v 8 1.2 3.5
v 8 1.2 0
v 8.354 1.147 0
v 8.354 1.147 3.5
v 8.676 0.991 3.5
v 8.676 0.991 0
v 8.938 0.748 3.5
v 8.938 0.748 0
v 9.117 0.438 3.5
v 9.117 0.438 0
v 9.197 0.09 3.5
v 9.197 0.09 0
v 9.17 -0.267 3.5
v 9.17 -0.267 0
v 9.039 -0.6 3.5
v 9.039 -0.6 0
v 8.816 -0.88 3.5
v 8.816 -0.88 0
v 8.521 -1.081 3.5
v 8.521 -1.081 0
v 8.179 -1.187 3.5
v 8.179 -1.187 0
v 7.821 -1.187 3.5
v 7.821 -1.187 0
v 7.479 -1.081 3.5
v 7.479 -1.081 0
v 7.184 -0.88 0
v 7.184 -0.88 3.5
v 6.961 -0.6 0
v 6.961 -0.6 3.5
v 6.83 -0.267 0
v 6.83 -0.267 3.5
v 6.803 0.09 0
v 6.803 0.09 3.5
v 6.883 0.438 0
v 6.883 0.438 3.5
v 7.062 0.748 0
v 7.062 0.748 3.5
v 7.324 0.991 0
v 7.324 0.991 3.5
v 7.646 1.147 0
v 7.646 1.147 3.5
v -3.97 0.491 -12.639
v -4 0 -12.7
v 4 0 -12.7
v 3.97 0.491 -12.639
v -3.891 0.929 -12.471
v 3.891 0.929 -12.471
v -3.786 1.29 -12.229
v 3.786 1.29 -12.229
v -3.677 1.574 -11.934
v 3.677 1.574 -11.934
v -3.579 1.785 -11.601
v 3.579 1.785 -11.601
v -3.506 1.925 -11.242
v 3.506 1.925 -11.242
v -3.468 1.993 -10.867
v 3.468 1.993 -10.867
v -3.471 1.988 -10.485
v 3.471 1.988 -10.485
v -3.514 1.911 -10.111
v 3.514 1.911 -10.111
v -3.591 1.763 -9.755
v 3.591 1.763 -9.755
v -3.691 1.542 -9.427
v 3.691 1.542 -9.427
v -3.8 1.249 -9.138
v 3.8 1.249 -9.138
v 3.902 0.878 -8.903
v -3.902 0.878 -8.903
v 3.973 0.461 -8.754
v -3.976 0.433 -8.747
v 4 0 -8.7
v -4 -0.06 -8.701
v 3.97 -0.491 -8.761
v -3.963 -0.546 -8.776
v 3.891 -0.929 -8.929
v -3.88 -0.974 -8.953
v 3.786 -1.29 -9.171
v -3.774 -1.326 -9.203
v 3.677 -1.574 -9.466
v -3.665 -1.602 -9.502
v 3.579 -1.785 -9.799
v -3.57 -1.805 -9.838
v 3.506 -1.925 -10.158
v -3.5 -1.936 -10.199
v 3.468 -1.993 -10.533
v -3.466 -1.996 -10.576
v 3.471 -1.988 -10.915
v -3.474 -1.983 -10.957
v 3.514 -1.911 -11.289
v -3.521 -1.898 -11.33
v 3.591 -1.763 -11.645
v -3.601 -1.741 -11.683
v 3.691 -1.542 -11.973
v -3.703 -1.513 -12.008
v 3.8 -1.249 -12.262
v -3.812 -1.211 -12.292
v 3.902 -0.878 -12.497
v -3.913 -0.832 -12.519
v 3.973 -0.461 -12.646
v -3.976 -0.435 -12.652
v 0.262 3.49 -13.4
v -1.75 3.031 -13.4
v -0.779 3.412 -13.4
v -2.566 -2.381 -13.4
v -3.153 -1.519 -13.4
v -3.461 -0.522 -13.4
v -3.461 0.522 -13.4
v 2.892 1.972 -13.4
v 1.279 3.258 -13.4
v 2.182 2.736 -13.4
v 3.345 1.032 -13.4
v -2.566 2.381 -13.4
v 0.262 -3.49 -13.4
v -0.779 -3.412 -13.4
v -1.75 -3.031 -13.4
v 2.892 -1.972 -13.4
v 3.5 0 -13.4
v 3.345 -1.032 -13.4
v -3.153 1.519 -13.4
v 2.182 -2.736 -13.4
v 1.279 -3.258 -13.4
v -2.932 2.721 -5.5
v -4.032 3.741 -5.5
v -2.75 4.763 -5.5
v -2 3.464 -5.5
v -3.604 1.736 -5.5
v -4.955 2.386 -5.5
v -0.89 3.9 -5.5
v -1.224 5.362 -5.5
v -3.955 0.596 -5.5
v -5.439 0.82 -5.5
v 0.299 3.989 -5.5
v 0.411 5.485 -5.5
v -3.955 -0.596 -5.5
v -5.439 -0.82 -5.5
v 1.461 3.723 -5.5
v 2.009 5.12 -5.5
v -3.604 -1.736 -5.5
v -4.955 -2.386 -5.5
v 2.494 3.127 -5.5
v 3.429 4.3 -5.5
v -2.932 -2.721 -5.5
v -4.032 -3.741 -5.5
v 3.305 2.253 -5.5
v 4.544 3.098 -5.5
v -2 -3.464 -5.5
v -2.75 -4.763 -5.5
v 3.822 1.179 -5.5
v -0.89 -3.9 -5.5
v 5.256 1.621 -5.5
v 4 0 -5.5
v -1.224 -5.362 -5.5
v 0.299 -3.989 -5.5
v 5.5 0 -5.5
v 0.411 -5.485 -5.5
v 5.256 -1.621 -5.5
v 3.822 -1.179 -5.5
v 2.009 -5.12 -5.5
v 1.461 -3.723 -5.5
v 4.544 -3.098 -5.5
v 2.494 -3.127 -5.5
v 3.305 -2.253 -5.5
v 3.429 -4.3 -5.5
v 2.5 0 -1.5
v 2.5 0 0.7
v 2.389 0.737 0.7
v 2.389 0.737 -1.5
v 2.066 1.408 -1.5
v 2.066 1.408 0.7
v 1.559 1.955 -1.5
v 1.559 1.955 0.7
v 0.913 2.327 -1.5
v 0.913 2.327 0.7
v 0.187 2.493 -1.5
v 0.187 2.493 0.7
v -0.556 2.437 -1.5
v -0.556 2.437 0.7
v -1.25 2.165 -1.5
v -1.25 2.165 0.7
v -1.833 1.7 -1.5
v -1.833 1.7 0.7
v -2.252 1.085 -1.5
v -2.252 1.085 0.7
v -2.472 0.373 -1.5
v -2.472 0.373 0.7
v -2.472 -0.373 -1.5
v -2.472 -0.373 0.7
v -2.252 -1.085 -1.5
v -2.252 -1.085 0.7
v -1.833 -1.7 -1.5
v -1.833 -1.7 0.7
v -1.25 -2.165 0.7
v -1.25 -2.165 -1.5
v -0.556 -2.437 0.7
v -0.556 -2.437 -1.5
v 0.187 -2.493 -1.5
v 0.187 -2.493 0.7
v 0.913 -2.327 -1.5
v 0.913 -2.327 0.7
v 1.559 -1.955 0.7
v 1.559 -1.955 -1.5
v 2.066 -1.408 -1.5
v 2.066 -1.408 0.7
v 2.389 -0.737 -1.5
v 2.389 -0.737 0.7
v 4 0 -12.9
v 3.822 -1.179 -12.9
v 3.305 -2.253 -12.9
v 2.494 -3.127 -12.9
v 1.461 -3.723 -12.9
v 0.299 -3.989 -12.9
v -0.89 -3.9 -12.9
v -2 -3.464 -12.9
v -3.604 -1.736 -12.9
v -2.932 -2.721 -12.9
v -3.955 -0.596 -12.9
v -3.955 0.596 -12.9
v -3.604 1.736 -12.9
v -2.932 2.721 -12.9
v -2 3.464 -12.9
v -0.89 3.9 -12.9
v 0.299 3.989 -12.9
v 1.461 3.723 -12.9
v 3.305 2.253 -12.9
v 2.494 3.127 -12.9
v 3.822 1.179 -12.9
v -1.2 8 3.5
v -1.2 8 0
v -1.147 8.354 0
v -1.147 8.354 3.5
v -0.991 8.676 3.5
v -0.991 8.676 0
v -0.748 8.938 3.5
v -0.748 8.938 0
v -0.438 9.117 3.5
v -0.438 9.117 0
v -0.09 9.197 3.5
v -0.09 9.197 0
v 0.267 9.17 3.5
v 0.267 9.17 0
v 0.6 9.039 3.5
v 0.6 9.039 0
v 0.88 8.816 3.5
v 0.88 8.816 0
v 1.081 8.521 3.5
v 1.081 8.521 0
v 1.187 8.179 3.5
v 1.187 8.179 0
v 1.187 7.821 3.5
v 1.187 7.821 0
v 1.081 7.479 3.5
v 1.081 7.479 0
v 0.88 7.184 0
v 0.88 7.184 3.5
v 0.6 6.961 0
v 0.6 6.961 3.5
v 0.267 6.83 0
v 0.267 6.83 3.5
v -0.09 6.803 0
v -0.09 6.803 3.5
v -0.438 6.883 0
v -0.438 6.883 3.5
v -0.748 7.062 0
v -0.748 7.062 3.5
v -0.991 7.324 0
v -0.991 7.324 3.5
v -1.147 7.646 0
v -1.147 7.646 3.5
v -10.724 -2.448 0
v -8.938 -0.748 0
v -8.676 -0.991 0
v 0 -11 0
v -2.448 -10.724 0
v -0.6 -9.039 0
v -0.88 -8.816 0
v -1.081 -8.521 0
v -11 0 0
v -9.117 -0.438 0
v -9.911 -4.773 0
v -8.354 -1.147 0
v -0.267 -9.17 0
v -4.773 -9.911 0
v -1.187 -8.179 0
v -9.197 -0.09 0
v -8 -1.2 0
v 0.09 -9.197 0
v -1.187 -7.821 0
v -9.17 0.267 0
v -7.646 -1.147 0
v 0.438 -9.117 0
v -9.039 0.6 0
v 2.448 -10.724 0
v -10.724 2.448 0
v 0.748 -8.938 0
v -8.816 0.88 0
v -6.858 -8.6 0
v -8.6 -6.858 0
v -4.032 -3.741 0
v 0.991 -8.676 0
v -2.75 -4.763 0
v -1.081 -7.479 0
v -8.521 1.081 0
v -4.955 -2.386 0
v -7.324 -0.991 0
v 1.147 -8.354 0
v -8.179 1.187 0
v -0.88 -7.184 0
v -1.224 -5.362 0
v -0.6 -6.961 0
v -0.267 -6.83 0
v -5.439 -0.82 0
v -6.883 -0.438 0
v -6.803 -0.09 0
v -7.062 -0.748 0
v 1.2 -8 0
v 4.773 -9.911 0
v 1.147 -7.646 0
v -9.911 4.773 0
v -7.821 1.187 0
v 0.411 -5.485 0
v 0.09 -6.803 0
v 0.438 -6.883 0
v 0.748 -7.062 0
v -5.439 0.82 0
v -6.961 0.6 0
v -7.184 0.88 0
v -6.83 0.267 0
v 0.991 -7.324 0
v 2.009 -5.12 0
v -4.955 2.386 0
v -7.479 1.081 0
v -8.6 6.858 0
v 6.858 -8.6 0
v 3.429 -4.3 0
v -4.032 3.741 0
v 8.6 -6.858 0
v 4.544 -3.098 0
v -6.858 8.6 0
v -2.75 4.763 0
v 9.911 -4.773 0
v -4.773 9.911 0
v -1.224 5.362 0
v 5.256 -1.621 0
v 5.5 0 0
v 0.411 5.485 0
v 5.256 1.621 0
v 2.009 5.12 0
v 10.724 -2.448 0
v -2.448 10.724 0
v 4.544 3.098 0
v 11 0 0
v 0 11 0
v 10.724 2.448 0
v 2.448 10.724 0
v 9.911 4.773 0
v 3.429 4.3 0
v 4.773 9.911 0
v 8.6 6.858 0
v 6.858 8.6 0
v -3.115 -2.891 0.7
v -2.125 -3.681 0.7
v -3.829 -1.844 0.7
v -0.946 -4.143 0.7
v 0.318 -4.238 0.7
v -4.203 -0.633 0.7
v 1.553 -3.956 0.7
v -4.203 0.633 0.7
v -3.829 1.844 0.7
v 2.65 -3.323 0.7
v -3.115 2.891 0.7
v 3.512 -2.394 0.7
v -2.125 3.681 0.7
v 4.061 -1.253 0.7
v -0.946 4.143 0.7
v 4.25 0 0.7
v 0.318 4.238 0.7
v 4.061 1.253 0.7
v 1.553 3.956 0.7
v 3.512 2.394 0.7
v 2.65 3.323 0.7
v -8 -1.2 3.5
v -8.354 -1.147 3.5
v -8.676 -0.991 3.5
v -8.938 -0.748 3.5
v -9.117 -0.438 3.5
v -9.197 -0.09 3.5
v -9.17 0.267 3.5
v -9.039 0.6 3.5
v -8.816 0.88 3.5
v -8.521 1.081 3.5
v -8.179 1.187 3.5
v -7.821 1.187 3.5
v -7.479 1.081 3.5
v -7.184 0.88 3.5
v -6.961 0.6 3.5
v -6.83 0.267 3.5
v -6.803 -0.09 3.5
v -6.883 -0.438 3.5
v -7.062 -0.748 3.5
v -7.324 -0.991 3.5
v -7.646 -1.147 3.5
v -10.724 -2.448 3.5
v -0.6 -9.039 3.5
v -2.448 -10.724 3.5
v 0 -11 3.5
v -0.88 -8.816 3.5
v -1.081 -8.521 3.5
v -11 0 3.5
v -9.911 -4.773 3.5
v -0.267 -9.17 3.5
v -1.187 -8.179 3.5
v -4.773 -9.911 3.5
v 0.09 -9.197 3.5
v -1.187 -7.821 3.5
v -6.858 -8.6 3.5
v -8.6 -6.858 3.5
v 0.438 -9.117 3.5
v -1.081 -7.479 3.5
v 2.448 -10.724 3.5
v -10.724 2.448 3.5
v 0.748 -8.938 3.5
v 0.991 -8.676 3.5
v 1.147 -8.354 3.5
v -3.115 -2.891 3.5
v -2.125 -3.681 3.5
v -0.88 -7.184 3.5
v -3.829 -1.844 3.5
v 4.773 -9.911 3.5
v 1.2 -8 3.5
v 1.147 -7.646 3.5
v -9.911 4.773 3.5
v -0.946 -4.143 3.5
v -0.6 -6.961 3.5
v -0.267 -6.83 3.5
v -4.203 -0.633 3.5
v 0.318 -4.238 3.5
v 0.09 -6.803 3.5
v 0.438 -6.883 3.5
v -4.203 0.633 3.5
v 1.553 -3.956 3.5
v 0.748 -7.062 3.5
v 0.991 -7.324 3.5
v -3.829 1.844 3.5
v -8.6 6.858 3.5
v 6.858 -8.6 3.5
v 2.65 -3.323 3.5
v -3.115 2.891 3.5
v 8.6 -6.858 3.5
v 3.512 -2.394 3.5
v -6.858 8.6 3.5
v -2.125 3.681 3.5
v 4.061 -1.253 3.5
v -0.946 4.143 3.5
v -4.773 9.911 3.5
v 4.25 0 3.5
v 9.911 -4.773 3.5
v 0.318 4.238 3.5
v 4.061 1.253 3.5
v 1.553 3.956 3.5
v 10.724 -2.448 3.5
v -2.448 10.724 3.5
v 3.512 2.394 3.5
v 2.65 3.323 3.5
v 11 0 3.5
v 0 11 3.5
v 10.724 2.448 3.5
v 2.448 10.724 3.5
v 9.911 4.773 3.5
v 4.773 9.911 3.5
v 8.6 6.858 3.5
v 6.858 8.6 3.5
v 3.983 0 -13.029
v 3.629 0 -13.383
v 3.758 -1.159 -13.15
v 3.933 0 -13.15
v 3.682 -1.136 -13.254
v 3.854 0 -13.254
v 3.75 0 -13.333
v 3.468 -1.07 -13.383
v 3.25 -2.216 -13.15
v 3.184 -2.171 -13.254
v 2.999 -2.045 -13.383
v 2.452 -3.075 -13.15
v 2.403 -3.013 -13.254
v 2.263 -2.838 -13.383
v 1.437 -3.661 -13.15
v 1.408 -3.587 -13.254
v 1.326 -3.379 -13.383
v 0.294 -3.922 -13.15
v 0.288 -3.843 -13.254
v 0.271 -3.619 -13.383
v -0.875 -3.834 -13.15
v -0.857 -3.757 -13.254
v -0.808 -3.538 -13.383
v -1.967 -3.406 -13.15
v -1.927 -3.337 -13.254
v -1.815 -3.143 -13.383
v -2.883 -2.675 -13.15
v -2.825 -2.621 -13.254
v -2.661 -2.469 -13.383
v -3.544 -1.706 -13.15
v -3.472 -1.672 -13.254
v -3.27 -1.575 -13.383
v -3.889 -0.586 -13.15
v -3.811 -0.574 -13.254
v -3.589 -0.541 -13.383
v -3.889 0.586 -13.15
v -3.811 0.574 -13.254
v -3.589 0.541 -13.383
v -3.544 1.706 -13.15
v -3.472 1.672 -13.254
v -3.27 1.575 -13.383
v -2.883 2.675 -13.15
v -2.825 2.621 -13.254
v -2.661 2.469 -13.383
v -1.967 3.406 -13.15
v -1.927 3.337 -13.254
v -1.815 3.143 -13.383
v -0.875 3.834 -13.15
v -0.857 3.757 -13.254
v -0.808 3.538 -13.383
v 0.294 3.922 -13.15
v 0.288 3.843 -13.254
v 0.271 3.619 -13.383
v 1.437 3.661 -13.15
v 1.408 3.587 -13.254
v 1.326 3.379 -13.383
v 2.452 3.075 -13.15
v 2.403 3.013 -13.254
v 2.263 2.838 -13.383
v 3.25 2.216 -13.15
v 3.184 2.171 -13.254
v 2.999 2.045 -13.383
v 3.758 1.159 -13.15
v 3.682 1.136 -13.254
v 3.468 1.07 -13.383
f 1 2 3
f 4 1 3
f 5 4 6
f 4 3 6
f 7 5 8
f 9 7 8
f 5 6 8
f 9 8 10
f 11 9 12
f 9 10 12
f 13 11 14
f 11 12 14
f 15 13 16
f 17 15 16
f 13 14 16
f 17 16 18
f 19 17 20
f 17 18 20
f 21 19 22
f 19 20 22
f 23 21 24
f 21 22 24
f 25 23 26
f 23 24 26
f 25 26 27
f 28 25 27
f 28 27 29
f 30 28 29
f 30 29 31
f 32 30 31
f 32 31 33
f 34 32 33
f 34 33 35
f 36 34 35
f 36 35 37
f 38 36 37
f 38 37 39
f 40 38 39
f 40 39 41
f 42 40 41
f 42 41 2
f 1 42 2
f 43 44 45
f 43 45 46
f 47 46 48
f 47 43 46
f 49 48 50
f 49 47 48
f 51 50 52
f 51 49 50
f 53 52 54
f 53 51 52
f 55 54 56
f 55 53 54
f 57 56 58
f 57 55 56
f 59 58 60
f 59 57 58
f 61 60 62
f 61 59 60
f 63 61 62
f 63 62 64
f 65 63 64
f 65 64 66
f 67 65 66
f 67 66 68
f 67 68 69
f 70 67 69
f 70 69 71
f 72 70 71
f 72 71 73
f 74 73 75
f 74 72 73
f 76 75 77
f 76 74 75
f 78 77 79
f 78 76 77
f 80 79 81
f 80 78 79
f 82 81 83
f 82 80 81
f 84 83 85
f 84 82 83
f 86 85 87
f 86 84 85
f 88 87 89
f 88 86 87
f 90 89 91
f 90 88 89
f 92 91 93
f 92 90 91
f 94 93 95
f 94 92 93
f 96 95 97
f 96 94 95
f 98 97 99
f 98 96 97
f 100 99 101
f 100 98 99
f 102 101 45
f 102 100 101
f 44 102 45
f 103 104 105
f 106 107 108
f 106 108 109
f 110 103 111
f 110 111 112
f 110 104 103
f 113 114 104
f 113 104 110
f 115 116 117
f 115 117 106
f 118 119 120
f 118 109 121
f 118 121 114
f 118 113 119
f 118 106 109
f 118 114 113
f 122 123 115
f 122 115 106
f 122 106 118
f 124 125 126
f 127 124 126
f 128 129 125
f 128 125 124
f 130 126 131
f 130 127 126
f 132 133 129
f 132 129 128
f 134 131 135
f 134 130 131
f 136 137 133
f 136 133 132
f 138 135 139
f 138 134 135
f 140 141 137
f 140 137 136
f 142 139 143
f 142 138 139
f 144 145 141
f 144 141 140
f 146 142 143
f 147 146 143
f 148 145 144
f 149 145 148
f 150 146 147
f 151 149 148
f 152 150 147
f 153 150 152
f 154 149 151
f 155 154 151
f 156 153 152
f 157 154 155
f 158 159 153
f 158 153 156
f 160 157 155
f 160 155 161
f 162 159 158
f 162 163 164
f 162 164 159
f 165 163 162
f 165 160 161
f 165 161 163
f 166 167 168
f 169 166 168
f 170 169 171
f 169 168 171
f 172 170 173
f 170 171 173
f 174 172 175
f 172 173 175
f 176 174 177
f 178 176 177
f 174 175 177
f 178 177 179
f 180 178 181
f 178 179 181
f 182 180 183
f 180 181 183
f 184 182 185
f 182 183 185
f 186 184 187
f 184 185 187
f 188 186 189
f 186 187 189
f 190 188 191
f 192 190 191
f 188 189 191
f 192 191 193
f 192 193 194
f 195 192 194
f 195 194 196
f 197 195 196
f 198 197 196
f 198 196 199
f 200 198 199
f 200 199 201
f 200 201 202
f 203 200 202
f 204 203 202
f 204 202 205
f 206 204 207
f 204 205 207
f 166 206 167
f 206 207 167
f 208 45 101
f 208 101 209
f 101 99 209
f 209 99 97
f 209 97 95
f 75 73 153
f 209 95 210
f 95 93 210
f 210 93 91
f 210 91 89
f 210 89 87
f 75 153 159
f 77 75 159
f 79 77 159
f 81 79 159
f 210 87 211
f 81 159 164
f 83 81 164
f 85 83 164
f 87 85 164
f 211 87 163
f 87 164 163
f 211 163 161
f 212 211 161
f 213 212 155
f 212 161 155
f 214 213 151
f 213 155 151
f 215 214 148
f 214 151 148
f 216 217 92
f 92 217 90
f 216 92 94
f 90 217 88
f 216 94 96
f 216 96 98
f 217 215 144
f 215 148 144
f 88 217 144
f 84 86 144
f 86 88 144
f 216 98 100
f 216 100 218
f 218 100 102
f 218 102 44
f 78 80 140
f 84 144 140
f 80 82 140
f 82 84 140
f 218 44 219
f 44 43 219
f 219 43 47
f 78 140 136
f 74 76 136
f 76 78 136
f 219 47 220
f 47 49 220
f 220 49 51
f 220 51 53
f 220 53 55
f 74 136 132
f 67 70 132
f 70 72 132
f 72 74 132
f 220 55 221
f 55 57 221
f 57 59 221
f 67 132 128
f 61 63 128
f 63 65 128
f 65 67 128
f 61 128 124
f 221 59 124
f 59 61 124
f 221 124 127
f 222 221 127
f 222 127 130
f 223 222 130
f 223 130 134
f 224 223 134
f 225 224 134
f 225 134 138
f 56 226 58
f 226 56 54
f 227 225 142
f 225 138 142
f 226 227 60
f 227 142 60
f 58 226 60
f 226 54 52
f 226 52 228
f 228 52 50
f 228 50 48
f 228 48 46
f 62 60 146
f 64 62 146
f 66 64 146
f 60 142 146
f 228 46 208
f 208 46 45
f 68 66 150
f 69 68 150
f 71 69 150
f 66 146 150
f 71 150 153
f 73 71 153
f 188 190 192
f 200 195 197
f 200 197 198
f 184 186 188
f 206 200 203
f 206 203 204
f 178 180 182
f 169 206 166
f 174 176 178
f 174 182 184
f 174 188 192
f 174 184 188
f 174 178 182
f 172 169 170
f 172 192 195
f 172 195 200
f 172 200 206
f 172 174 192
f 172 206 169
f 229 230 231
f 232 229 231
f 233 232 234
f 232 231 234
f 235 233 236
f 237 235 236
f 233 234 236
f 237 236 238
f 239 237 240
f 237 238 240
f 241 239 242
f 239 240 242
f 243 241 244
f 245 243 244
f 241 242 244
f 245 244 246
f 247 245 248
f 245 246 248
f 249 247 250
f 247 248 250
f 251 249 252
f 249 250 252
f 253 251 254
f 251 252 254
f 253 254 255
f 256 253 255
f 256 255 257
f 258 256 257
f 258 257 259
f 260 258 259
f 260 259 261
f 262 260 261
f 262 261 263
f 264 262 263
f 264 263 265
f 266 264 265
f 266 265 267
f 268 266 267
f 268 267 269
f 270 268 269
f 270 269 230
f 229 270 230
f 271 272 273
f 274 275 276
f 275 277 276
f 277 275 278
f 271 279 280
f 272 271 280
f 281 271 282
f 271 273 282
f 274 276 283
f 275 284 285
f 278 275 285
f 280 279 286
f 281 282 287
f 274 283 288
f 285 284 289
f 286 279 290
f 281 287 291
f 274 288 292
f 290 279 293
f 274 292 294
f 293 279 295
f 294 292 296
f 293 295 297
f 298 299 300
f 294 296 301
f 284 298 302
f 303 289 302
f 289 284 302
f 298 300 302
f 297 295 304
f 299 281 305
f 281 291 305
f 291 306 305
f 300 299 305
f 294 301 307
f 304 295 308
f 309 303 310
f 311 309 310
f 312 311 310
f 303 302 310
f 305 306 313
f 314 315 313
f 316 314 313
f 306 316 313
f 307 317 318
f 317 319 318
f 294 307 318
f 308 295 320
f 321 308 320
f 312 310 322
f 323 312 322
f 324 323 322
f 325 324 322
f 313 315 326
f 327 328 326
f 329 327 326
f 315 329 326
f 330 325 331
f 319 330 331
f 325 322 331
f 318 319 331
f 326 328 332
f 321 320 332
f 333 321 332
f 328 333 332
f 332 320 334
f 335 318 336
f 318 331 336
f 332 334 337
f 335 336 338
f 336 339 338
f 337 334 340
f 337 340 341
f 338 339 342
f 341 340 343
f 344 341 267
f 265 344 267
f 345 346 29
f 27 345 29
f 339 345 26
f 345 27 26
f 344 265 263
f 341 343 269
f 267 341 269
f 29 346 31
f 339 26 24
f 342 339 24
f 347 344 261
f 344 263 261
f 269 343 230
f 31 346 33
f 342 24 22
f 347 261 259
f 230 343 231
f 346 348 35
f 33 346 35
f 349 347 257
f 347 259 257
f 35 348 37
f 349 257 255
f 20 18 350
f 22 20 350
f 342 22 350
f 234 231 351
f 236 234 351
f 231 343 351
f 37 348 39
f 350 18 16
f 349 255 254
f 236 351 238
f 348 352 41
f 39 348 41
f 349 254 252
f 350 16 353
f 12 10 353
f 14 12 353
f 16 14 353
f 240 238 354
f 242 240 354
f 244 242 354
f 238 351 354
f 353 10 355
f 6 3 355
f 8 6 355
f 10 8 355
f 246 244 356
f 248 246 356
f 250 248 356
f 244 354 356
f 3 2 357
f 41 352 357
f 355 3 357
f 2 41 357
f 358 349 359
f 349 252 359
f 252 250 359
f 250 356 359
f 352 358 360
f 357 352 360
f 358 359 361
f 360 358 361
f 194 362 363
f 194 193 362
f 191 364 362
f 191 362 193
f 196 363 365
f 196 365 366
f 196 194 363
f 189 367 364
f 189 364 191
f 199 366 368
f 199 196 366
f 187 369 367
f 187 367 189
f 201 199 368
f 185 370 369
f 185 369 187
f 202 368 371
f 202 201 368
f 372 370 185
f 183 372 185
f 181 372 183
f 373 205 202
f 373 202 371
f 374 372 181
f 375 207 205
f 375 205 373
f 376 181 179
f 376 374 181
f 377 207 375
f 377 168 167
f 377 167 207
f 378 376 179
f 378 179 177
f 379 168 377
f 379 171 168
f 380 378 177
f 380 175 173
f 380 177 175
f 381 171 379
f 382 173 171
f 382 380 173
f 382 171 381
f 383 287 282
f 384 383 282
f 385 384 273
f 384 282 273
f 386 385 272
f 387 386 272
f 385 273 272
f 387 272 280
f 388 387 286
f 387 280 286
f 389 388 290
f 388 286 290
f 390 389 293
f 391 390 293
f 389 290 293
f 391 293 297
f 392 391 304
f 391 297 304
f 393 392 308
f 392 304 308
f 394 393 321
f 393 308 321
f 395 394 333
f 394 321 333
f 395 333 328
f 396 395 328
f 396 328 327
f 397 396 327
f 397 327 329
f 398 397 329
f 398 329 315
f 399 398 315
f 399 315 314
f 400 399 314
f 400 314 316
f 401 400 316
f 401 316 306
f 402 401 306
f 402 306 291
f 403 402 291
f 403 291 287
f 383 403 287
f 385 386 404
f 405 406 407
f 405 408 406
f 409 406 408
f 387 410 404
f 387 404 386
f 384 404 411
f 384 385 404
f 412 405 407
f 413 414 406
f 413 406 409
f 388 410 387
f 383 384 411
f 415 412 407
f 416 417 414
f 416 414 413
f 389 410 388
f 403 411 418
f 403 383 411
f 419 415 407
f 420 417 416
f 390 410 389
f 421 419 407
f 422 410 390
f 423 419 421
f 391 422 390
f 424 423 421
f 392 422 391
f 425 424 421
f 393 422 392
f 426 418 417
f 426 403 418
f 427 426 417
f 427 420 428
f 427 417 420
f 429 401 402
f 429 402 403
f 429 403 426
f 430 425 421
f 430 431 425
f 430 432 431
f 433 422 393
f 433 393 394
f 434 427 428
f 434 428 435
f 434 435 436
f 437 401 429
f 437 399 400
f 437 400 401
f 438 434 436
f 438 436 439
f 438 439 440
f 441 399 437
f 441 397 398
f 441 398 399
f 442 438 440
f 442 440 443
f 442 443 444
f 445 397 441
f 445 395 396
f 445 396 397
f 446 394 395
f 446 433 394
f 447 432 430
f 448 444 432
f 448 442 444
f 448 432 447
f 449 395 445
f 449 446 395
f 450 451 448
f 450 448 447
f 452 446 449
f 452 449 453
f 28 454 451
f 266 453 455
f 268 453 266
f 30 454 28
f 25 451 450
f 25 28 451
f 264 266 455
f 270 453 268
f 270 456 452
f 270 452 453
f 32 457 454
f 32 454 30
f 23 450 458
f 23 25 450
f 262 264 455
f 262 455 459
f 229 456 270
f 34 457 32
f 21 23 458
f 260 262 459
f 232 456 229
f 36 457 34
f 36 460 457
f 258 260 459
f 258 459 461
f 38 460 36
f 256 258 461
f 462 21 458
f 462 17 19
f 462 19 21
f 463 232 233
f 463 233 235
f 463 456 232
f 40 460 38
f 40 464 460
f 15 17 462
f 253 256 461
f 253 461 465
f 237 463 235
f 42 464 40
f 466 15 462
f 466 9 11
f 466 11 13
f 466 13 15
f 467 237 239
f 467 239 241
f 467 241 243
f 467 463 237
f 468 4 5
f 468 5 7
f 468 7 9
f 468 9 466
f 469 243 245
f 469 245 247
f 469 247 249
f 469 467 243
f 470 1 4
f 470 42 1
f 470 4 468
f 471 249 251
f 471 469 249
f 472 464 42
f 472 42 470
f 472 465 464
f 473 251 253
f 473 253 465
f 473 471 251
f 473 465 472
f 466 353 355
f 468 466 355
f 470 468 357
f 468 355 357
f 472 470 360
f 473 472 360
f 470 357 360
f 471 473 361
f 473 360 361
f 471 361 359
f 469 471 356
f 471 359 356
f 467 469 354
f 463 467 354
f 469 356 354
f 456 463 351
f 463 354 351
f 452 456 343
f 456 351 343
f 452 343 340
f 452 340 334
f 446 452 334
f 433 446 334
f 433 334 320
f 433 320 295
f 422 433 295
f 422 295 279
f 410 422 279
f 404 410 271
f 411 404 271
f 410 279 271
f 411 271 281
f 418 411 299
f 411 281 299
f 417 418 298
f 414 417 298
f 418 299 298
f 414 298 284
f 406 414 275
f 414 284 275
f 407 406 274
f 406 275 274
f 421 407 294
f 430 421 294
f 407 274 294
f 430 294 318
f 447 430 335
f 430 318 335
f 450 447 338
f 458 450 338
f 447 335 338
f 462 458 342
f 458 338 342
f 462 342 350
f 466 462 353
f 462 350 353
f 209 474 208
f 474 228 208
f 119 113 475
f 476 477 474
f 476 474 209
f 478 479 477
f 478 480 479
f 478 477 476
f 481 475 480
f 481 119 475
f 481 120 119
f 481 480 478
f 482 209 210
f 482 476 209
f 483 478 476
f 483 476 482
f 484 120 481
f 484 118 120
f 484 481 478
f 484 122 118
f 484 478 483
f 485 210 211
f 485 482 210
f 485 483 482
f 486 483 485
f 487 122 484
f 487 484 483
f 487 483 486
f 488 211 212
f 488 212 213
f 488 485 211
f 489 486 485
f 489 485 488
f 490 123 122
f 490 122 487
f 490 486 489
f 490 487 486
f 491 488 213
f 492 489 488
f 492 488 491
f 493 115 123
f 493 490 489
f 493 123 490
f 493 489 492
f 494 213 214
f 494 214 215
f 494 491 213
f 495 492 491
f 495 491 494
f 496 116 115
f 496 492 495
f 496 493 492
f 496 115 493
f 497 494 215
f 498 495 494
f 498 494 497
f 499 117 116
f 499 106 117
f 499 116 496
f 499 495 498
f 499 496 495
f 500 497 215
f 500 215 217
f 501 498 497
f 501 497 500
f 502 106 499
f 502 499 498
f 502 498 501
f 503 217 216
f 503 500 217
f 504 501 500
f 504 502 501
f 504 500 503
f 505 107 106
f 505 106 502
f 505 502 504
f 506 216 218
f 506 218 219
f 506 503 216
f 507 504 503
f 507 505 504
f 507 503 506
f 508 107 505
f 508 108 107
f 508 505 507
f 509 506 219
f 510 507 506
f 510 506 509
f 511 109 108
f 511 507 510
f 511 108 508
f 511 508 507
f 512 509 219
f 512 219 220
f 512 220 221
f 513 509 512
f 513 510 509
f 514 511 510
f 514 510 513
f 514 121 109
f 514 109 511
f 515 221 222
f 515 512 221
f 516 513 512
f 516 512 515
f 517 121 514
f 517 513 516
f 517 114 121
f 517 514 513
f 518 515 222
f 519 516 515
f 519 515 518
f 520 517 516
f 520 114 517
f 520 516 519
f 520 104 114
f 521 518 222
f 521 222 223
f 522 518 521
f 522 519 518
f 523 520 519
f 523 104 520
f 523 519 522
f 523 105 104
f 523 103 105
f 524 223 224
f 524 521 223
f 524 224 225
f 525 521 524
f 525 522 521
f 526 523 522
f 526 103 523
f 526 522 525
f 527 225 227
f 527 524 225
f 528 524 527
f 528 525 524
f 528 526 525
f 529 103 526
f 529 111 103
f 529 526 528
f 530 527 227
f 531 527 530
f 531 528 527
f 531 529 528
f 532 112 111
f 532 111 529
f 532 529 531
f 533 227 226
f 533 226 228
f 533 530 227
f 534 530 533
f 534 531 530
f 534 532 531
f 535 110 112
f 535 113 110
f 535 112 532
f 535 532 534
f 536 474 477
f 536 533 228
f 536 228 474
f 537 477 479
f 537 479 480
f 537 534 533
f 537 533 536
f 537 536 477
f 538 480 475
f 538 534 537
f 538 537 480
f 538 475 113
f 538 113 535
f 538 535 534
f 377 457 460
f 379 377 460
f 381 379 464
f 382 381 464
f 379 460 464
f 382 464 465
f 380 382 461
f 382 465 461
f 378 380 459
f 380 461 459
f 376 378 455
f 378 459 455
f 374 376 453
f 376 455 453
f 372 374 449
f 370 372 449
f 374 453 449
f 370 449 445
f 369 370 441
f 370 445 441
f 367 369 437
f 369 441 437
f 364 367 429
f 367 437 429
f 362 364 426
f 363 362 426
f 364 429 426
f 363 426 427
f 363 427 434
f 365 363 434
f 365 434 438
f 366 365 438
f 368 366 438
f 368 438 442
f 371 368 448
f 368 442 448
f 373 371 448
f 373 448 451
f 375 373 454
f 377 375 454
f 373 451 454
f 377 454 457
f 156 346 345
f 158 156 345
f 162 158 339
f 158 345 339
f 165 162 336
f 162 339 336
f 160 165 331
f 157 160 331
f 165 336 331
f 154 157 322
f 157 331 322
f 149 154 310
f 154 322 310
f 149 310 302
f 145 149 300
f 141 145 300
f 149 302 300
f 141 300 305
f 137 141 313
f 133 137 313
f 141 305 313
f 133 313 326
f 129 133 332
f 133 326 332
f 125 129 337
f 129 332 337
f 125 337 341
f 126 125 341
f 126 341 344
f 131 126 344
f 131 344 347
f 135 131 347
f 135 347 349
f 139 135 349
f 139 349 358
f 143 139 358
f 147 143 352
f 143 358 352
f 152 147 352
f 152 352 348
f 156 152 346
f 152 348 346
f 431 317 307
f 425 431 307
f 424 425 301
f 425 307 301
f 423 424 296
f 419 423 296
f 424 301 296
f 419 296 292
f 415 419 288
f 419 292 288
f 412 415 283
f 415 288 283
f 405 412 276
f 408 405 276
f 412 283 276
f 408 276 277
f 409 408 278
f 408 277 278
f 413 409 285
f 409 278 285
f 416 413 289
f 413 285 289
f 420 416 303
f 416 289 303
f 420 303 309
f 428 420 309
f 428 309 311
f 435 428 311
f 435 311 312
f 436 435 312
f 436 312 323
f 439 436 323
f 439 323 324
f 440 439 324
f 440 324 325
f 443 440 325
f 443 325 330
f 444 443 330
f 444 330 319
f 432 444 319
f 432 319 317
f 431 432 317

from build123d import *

# Parameters (mm, degrees)
SKETCH_2_R               = 11
EXTRUDE_1_DEPTH          = 3.5
SKETCH_3_R               = 4.25
CUT_EXTRUDE_1_DEPTH      = 2.8
SKETCH_4_R               = 1.2
CUT_EXTRUDE_2_DEPTH      = 16.945218719
PATTERN_CIRCULAR_1_COUNT = 4
SKETCH_6_R               = 4
EXTRUDE_2_DEPTH          = 13.4
CUT_EXTRUDE1_DEPTH       = 21.531926359
CUT_EXTRUDE1_DEPTH_BACK  = 21.531926359
SKETCH1_R                = 2
SKETCH_15_R              = 5.5
EXTRUDE_3_DEPTH          = 5.5
FILLET_1_R               = 0.5
SKETCH_11_R              = 2.5
CUT_EXTRUDE_6_DEPTH      = 2.2


with BuildPart() as part:
    # 草图2 → 凸台-拉伸1 (new body)
    with BuildSketch(Plane.XY):
        Circle(SKETCH_2_R)
    extrude(amount=EXTRUDE_1_DEPTH)

    # 草图3 → 切除-拉伸1 (cut)
    with BuildSketch(Plane.XY.offset(3.5)):
        Circle(SKETCH_3_R)
    extrude(amount=-CUT_EXTRUDE_1_DEPTH, mode=Mode.SUBTRACT)

    # 草图4 → 切除-拉伸2 (cut, through all)
    with BuildSketch(Plane(origin=(0, 0, 0), x_dir=(-1, 0, 0), z_dir=(0, 0, -1))):
        with Locations((0, 8)):
            Circle(SKETCH_4_R)
    cut_extrude_2 = extrude(amount=-CUT_EXTRUDE_2_DEPTH, mode=Mode.SUBTRACT)

    # 阵列(圆周)1: 切除-拉伸2 ×4 about axis
    pattern_circular_1_axis = Axis((0, 0, 0), (0, 0, 1))
    for i in range(1, PATTERN_CIRCULAR_1_COUNT):
        add(cut_extrude_2.rotate(pattern_circular_1_axis, i * 360 / PATTERN_CIRCULAR_1_COUNT), mode=Mode.SUBTRACT)

    # 草图6 → 凸台-拉伸2 (add)
    with BuildSketch(Plane(origin=(0, 0, 0), x_dir=(-1, 0, 0), z_dir=(0, 0, -1))):
        with Locations(Location((0, 0, 0), (0, 0, 180))):
            Circle(SKETCH_6_R)
    extrude(amount=EXTRUDE_2_DEPTH)

    # Sketch1 → Cut-Extrude1 (cut, two sides: drawn at the far end of the back side and taken through both)
    with BuildSketch(Plane(origin=(0, 0, 0), x_dir=(0, 0, -1), z_dir=(1, 0, 0)).offset(-CUT_EXTRUDE1_DEPTH_BACK)):
        with Locations((10.7, 0)):
            Circle(SKETCH1_R)
    extrude(amount=CUT_EXTRUDE1_DEPTH + CUT_EXTRUDE1_DEPTH_BACK, mode=Mode.SUBTRACT)

    # 草图15 → 凸台-拉伸3 (add)
    with BuildSketch(Plane(origin=(0, 0, 0), x_dir=(-1, 0, 0), z_dir=(0, 0, -1))):
        with Locations(Location((0, 0, 0), (0, 0, 180))):
            Circle(SKETCH_15_R)
    extrude(amount=EXTRUDE_3_DEPTH)

    # 圆角1
    fillet_1_edges = [part.edges().sort_by_distance(p)[0] for p in [
        (-4, 0, -13.4),
    ]]
    fillet(fillet_1_edges, radius=FILLET_1_R)

    # 草图11 → 切除-拉伸6 (cut)
    with BuildSketch(Plane.XY.offset(0.7)):
        Circle(SKETCH_11_R)
    extrude(amount=-CUT_EXTRUDE_6_DEPTH, mode=Mode.SUBTRACT)


solid = part.part
